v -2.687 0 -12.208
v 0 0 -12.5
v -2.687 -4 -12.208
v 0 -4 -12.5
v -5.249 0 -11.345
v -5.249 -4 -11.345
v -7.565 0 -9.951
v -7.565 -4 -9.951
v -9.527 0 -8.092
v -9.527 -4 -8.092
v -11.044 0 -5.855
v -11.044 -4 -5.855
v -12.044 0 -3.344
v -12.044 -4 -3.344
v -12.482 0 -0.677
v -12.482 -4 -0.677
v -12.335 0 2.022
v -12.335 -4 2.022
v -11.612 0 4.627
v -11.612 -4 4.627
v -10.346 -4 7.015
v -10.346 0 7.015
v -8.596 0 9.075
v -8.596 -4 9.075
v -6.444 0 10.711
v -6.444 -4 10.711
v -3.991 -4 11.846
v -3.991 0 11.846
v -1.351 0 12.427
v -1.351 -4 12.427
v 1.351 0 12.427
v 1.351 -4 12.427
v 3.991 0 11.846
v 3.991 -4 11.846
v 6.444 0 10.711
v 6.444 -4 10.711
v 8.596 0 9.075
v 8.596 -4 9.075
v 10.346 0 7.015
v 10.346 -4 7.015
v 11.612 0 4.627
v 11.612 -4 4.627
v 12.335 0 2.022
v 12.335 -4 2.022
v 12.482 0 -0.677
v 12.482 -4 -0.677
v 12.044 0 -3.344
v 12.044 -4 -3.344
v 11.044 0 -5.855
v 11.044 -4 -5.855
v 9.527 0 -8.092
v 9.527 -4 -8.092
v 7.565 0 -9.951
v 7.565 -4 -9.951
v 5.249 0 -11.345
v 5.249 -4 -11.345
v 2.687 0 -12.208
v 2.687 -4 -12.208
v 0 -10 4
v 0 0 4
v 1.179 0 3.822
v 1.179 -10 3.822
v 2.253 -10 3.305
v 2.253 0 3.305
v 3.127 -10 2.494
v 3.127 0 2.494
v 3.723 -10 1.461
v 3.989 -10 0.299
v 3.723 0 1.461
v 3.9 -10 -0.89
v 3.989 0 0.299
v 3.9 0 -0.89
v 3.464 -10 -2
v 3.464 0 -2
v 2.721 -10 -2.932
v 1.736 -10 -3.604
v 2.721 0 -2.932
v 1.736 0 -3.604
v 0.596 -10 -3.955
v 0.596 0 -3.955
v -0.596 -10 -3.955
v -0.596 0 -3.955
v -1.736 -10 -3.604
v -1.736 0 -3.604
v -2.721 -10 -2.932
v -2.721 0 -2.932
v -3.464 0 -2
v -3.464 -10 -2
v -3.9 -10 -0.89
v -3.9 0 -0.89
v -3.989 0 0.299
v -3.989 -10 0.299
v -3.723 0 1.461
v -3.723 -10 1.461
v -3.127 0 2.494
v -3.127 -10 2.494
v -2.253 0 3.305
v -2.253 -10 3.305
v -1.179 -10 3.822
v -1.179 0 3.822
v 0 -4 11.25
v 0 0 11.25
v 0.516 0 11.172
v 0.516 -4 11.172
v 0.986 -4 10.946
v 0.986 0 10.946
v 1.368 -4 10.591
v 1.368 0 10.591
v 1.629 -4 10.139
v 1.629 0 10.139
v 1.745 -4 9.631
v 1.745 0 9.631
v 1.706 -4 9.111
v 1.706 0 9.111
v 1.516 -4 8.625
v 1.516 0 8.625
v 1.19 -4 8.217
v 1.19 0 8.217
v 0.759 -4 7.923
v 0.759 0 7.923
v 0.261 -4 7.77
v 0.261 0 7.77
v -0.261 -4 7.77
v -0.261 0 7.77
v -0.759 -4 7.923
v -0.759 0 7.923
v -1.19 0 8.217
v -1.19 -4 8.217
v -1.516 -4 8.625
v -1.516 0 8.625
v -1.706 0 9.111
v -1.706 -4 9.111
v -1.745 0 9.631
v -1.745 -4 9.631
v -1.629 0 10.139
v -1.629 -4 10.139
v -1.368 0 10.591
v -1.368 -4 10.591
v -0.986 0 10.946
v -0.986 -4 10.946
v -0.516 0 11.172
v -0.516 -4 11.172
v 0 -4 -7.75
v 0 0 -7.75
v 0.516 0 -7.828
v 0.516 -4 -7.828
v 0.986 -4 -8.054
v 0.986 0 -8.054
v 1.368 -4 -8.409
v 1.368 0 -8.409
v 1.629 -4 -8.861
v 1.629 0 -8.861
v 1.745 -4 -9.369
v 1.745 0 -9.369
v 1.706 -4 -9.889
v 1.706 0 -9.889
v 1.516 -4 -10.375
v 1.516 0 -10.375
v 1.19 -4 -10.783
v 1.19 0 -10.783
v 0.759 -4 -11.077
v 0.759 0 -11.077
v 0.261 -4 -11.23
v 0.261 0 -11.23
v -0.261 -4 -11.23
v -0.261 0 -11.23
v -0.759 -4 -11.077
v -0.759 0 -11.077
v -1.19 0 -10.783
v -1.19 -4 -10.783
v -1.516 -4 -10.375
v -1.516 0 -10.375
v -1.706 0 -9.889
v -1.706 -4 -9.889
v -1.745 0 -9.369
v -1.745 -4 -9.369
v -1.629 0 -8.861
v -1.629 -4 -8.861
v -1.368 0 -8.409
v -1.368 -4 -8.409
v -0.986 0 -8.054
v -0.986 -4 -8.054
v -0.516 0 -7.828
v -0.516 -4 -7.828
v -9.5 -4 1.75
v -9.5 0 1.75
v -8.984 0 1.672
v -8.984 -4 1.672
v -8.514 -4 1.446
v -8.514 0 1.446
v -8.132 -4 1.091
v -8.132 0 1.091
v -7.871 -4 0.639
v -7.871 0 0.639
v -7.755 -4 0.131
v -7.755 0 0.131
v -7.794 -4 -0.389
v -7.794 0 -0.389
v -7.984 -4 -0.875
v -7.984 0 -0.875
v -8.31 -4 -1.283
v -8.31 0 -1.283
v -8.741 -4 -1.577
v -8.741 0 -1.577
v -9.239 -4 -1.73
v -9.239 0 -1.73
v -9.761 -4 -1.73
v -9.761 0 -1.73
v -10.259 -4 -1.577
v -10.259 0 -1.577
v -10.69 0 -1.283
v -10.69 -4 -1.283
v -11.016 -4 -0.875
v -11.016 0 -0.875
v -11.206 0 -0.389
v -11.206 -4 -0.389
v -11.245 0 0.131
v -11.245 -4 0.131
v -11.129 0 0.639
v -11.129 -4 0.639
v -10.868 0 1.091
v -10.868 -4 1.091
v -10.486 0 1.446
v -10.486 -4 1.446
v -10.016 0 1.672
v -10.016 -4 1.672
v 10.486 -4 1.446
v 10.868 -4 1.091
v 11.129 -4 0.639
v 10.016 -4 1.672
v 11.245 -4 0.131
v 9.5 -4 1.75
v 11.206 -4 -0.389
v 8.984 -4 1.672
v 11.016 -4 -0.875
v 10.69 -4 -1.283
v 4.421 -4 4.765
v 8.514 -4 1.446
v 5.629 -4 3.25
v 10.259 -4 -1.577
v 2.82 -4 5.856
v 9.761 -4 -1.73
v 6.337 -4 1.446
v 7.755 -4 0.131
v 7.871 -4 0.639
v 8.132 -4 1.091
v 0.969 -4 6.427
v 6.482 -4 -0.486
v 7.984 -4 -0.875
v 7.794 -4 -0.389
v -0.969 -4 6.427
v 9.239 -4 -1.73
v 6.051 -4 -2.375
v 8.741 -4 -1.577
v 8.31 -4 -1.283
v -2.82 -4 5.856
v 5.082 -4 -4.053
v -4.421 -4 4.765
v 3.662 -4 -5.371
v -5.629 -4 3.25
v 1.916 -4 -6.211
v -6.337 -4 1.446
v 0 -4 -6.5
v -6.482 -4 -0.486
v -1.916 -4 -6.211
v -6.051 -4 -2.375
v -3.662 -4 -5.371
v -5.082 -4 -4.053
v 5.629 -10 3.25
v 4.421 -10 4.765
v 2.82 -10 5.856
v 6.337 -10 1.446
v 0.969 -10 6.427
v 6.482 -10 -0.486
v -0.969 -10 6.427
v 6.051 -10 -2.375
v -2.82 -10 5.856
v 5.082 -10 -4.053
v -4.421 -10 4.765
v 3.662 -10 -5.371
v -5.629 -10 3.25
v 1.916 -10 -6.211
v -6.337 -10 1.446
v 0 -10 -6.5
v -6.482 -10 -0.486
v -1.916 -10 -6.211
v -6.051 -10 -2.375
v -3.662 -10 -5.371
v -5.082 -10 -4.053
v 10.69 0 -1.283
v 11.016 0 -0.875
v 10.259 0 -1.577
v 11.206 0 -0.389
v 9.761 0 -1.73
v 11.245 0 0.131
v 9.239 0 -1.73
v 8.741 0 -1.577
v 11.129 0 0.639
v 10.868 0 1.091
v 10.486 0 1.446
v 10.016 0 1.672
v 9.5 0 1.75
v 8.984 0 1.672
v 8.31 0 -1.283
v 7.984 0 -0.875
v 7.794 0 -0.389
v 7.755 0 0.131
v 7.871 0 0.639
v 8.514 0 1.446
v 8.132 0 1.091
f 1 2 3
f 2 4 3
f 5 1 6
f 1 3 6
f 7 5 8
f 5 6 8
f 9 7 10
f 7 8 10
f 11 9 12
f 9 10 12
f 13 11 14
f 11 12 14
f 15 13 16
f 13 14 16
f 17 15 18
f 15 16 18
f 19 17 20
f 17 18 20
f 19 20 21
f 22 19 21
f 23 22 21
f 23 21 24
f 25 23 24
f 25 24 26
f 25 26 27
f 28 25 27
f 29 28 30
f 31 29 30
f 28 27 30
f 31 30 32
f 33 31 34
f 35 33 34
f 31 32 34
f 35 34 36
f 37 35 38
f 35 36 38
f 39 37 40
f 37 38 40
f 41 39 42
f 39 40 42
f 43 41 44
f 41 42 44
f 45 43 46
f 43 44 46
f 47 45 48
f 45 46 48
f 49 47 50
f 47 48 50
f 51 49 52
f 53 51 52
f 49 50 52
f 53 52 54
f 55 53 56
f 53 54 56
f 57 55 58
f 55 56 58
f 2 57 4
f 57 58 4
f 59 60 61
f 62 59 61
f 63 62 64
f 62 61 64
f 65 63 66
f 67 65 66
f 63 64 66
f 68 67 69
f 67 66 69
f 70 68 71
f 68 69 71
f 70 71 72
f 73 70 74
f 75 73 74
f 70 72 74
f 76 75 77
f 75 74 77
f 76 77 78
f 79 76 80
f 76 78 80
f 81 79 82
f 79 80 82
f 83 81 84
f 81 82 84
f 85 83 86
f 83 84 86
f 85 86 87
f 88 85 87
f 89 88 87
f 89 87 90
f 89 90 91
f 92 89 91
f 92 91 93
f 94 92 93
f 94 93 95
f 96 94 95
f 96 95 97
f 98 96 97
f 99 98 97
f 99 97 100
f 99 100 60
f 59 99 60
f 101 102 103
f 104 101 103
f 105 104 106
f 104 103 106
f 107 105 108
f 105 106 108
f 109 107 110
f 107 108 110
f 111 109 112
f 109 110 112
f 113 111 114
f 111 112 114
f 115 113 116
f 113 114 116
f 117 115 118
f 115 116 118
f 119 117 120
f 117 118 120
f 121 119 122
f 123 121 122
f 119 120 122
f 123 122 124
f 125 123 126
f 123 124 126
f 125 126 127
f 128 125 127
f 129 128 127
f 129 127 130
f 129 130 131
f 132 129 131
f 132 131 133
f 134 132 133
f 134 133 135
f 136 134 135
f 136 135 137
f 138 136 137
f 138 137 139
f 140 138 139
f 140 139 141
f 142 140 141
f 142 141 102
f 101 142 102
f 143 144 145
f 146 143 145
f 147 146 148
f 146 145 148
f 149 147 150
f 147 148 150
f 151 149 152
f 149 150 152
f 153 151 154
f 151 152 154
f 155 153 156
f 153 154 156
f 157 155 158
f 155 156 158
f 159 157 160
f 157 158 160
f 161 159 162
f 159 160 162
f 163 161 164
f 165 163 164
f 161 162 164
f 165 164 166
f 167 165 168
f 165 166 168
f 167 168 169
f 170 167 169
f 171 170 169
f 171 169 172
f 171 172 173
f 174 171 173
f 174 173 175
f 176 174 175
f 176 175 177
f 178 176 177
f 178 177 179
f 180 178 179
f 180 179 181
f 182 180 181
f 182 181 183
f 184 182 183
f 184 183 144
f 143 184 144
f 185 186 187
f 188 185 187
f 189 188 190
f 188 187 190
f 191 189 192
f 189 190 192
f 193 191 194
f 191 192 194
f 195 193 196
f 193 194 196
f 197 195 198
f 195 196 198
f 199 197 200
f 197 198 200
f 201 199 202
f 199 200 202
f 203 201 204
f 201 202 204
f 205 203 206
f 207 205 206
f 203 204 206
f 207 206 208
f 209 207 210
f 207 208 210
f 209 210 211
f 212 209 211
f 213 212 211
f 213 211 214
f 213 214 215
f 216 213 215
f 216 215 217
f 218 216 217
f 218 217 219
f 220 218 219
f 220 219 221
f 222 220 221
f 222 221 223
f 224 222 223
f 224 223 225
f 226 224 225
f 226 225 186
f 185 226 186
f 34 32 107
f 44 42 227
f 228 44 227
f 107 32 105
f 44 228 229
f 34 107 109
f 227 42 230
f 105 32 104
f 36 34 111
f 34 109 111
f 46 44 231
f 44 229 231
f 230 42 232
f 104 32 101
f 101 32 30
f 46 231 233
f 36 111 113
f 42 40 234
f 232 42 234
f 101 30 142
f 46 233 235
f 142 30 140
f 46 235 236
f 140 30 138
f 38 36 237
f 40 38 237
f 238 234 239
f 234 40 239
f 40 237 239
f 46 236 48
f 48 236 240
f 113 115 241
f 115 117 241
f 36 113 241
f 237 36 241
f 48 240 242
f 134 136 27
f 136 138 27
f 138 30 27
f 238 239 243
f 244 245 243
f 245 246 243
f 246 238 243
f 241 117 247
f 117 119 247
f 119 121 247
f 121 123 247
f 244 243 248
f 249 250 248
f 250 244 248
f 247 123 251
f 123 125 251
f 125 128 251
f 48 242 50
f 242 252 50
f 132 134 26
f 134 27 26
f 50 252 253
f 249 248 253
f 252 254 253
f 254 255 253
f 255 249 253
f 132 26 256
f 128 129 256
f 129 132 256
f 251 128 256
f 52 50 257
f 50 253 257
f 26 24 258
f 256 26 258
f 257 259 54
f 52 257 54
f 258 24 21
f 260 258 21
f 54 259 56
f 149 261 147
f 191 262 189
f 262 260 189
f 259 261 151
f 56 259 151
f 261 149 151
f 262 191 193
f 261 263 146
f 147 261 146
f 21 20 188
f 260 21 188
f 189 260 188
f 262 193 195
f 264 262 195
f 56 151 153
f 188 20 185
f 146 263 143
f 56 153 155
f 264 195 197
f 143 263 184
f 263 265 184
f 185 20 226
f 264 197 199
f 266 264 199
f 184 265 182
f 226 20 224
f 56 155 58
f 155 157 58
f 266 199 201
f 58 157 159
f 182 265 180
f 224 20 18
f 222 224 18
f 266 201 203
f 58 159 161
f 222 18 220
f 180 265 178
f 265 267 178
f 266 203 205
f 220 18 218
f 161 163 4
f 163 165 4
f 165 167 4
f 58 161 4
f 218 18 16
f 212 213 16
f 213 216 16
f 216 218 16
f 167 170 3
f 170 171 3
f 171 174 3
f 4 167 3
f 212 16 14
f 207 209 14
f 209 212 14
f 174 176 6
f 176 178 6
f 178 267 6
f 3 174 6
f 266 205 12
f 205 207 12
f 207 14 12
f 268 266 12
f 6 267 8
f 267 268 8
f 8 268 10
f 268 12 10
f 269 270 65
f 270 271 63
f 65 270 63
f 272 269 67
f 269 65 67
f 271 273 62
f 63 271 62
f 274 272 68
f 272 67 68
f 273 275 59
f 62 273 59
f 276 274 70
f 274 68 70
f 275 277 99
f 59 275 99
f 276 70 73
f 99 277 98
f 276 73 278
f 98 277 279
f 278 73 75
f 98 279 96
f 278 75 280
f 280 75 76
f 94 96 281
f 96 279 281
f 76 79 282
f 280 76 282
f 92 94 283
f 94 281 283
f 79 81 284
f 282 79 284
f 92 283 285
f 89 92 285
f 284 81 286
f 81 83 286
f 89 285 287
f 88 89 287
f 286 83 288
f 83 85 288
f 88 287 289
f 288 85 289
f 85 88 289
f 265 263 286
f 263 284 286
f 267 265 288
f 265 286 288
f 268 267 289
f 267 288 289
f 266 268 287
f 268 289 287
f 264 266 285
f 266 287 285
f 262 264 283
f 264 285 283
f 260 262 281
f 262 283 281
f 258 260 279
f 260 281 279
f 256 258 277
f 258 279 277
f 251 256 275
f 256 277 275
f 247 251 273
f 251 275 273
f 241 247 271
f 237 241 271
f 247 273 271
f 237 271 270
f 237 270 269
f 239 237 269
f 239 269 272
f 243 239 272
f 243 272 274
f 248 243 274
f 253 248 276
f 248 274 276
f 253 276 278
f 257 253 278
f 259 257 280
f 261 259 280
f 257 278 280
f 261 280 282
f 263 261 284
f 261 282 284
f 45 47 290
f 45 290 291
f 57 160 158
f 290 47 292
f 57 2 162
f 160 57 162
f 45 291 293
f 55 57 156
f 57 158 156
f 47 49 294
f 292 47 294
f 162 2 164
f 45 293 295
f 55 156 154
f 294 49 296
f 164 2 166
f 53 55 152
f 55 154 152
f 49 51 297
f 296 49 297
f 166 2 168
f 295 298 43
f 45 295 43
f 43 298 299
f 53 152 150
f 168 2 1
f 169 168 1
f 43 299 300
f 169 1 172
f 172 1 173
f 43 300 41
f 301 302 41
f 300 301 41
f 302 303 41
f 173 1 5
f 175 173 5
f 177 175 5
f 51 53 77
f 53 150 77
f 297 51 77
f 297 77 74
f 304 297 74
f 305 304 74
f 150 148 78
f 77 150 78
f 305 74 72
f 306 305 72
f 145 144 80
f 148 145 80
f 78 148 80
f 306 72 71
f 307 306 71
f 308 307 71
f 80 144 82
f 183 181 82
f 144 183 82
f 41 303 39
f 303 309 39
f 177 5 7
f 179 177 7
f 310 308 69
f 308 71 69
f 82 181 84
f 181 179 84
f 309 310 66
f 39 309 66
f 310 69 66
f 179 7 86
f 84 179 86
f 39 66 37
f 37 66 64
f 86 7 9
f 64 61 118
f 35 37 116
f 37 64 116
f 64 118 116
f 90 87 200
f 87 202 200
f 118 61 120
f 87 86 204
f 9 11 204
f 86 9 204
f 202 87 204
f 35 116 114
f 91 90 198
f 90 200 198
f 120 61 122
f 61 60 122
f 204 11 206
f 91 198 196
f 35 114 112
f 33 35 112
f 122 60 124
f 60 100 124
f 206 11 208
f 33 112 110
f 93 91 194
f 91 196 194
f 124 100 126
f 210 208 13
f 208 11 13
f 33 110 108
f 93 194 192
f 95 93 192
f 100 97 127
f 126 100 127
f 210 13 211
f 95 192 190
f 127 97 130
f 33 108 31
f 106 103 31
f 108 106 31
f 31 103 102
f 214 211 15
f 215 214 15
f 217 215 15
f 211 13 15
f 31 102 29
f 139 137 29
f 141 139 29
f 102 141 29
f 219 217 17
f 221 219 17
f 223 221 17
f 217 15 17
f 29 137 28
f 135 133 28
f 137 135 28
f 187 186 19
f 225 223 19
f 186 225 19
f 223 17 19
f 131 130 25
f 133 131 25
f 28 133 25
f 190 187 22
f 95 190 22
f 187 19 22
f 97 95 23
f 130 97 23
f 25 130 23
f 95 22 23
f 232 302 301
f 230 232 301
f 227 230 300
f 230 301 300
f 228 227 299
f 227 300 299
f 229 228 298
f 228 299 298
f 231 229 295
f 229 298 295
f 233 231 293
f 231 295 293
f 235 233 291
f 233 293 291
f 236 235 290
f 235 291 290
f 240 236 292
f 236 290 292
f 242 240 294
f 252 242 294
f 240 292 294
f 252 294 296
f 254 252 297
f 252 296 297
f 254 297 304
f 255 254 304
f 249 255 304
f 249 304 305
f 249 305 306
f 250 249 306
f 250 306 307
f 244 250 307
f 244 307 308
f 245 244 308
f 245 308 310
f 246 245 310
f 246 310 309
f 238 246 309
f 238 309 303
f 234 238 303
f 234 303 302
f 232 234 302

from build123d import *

# Parameters (mm, degrees)
SKETCH2_R          = 4
SKETCH2_R_2        = 1.75
CUT_EXTRUDE1_DEPTH = 21.310096012


with BuildPart() as part:
    # Sketch1 → Revolve1 (revolve)
    with BuildSketch(Plane.XY, mode=Mode.PRIVATE) as revolve1_sk:
        Polygon((0, 0), (12.5, 0), (12.5, -4), (6.5, -4), (6.5, -10), (0, -10), align=None)
    revolve(revolve1_sk.sketch.rotate(Axis((0, -10, 0), (0, 1, 0)), 90), axis=Axis((0, -10, 0), (0, 1, 0)))

    # Sketch2 → Cut-Extrude1 (cut, through all)
    with BuildSketch(Plane(origin=(0, 0, 0), x_dir=(1, 0, 0), z_dir=(0, 1, 0))):
        with Locations(Location((0, 0, 0), (0, 0, 270))):
            Circle(SKETCH2_R)
        with Locations(Location((0, 9.5, 0), (0, 0, 270))):
            Circle(SKETCH2_R_2)
        with Locations(Location((9.5, 0, 0), (0, 0, 270))):
            Circle(SKETCH2_R_2)
        with Locations(Location((0, -9.5, 0), (0, 0, 270))):
            Circle(SKETCH2_R_2)
        with Locations(Location((-9.5, 0, 0), (0, 0, 270))):
            Circle(SKETCH2_R_2)
    extrude(amount=-CUT_EXTRUDE1_DEPTH, mode=Mode.SUBTRACT)


solid = part.part
